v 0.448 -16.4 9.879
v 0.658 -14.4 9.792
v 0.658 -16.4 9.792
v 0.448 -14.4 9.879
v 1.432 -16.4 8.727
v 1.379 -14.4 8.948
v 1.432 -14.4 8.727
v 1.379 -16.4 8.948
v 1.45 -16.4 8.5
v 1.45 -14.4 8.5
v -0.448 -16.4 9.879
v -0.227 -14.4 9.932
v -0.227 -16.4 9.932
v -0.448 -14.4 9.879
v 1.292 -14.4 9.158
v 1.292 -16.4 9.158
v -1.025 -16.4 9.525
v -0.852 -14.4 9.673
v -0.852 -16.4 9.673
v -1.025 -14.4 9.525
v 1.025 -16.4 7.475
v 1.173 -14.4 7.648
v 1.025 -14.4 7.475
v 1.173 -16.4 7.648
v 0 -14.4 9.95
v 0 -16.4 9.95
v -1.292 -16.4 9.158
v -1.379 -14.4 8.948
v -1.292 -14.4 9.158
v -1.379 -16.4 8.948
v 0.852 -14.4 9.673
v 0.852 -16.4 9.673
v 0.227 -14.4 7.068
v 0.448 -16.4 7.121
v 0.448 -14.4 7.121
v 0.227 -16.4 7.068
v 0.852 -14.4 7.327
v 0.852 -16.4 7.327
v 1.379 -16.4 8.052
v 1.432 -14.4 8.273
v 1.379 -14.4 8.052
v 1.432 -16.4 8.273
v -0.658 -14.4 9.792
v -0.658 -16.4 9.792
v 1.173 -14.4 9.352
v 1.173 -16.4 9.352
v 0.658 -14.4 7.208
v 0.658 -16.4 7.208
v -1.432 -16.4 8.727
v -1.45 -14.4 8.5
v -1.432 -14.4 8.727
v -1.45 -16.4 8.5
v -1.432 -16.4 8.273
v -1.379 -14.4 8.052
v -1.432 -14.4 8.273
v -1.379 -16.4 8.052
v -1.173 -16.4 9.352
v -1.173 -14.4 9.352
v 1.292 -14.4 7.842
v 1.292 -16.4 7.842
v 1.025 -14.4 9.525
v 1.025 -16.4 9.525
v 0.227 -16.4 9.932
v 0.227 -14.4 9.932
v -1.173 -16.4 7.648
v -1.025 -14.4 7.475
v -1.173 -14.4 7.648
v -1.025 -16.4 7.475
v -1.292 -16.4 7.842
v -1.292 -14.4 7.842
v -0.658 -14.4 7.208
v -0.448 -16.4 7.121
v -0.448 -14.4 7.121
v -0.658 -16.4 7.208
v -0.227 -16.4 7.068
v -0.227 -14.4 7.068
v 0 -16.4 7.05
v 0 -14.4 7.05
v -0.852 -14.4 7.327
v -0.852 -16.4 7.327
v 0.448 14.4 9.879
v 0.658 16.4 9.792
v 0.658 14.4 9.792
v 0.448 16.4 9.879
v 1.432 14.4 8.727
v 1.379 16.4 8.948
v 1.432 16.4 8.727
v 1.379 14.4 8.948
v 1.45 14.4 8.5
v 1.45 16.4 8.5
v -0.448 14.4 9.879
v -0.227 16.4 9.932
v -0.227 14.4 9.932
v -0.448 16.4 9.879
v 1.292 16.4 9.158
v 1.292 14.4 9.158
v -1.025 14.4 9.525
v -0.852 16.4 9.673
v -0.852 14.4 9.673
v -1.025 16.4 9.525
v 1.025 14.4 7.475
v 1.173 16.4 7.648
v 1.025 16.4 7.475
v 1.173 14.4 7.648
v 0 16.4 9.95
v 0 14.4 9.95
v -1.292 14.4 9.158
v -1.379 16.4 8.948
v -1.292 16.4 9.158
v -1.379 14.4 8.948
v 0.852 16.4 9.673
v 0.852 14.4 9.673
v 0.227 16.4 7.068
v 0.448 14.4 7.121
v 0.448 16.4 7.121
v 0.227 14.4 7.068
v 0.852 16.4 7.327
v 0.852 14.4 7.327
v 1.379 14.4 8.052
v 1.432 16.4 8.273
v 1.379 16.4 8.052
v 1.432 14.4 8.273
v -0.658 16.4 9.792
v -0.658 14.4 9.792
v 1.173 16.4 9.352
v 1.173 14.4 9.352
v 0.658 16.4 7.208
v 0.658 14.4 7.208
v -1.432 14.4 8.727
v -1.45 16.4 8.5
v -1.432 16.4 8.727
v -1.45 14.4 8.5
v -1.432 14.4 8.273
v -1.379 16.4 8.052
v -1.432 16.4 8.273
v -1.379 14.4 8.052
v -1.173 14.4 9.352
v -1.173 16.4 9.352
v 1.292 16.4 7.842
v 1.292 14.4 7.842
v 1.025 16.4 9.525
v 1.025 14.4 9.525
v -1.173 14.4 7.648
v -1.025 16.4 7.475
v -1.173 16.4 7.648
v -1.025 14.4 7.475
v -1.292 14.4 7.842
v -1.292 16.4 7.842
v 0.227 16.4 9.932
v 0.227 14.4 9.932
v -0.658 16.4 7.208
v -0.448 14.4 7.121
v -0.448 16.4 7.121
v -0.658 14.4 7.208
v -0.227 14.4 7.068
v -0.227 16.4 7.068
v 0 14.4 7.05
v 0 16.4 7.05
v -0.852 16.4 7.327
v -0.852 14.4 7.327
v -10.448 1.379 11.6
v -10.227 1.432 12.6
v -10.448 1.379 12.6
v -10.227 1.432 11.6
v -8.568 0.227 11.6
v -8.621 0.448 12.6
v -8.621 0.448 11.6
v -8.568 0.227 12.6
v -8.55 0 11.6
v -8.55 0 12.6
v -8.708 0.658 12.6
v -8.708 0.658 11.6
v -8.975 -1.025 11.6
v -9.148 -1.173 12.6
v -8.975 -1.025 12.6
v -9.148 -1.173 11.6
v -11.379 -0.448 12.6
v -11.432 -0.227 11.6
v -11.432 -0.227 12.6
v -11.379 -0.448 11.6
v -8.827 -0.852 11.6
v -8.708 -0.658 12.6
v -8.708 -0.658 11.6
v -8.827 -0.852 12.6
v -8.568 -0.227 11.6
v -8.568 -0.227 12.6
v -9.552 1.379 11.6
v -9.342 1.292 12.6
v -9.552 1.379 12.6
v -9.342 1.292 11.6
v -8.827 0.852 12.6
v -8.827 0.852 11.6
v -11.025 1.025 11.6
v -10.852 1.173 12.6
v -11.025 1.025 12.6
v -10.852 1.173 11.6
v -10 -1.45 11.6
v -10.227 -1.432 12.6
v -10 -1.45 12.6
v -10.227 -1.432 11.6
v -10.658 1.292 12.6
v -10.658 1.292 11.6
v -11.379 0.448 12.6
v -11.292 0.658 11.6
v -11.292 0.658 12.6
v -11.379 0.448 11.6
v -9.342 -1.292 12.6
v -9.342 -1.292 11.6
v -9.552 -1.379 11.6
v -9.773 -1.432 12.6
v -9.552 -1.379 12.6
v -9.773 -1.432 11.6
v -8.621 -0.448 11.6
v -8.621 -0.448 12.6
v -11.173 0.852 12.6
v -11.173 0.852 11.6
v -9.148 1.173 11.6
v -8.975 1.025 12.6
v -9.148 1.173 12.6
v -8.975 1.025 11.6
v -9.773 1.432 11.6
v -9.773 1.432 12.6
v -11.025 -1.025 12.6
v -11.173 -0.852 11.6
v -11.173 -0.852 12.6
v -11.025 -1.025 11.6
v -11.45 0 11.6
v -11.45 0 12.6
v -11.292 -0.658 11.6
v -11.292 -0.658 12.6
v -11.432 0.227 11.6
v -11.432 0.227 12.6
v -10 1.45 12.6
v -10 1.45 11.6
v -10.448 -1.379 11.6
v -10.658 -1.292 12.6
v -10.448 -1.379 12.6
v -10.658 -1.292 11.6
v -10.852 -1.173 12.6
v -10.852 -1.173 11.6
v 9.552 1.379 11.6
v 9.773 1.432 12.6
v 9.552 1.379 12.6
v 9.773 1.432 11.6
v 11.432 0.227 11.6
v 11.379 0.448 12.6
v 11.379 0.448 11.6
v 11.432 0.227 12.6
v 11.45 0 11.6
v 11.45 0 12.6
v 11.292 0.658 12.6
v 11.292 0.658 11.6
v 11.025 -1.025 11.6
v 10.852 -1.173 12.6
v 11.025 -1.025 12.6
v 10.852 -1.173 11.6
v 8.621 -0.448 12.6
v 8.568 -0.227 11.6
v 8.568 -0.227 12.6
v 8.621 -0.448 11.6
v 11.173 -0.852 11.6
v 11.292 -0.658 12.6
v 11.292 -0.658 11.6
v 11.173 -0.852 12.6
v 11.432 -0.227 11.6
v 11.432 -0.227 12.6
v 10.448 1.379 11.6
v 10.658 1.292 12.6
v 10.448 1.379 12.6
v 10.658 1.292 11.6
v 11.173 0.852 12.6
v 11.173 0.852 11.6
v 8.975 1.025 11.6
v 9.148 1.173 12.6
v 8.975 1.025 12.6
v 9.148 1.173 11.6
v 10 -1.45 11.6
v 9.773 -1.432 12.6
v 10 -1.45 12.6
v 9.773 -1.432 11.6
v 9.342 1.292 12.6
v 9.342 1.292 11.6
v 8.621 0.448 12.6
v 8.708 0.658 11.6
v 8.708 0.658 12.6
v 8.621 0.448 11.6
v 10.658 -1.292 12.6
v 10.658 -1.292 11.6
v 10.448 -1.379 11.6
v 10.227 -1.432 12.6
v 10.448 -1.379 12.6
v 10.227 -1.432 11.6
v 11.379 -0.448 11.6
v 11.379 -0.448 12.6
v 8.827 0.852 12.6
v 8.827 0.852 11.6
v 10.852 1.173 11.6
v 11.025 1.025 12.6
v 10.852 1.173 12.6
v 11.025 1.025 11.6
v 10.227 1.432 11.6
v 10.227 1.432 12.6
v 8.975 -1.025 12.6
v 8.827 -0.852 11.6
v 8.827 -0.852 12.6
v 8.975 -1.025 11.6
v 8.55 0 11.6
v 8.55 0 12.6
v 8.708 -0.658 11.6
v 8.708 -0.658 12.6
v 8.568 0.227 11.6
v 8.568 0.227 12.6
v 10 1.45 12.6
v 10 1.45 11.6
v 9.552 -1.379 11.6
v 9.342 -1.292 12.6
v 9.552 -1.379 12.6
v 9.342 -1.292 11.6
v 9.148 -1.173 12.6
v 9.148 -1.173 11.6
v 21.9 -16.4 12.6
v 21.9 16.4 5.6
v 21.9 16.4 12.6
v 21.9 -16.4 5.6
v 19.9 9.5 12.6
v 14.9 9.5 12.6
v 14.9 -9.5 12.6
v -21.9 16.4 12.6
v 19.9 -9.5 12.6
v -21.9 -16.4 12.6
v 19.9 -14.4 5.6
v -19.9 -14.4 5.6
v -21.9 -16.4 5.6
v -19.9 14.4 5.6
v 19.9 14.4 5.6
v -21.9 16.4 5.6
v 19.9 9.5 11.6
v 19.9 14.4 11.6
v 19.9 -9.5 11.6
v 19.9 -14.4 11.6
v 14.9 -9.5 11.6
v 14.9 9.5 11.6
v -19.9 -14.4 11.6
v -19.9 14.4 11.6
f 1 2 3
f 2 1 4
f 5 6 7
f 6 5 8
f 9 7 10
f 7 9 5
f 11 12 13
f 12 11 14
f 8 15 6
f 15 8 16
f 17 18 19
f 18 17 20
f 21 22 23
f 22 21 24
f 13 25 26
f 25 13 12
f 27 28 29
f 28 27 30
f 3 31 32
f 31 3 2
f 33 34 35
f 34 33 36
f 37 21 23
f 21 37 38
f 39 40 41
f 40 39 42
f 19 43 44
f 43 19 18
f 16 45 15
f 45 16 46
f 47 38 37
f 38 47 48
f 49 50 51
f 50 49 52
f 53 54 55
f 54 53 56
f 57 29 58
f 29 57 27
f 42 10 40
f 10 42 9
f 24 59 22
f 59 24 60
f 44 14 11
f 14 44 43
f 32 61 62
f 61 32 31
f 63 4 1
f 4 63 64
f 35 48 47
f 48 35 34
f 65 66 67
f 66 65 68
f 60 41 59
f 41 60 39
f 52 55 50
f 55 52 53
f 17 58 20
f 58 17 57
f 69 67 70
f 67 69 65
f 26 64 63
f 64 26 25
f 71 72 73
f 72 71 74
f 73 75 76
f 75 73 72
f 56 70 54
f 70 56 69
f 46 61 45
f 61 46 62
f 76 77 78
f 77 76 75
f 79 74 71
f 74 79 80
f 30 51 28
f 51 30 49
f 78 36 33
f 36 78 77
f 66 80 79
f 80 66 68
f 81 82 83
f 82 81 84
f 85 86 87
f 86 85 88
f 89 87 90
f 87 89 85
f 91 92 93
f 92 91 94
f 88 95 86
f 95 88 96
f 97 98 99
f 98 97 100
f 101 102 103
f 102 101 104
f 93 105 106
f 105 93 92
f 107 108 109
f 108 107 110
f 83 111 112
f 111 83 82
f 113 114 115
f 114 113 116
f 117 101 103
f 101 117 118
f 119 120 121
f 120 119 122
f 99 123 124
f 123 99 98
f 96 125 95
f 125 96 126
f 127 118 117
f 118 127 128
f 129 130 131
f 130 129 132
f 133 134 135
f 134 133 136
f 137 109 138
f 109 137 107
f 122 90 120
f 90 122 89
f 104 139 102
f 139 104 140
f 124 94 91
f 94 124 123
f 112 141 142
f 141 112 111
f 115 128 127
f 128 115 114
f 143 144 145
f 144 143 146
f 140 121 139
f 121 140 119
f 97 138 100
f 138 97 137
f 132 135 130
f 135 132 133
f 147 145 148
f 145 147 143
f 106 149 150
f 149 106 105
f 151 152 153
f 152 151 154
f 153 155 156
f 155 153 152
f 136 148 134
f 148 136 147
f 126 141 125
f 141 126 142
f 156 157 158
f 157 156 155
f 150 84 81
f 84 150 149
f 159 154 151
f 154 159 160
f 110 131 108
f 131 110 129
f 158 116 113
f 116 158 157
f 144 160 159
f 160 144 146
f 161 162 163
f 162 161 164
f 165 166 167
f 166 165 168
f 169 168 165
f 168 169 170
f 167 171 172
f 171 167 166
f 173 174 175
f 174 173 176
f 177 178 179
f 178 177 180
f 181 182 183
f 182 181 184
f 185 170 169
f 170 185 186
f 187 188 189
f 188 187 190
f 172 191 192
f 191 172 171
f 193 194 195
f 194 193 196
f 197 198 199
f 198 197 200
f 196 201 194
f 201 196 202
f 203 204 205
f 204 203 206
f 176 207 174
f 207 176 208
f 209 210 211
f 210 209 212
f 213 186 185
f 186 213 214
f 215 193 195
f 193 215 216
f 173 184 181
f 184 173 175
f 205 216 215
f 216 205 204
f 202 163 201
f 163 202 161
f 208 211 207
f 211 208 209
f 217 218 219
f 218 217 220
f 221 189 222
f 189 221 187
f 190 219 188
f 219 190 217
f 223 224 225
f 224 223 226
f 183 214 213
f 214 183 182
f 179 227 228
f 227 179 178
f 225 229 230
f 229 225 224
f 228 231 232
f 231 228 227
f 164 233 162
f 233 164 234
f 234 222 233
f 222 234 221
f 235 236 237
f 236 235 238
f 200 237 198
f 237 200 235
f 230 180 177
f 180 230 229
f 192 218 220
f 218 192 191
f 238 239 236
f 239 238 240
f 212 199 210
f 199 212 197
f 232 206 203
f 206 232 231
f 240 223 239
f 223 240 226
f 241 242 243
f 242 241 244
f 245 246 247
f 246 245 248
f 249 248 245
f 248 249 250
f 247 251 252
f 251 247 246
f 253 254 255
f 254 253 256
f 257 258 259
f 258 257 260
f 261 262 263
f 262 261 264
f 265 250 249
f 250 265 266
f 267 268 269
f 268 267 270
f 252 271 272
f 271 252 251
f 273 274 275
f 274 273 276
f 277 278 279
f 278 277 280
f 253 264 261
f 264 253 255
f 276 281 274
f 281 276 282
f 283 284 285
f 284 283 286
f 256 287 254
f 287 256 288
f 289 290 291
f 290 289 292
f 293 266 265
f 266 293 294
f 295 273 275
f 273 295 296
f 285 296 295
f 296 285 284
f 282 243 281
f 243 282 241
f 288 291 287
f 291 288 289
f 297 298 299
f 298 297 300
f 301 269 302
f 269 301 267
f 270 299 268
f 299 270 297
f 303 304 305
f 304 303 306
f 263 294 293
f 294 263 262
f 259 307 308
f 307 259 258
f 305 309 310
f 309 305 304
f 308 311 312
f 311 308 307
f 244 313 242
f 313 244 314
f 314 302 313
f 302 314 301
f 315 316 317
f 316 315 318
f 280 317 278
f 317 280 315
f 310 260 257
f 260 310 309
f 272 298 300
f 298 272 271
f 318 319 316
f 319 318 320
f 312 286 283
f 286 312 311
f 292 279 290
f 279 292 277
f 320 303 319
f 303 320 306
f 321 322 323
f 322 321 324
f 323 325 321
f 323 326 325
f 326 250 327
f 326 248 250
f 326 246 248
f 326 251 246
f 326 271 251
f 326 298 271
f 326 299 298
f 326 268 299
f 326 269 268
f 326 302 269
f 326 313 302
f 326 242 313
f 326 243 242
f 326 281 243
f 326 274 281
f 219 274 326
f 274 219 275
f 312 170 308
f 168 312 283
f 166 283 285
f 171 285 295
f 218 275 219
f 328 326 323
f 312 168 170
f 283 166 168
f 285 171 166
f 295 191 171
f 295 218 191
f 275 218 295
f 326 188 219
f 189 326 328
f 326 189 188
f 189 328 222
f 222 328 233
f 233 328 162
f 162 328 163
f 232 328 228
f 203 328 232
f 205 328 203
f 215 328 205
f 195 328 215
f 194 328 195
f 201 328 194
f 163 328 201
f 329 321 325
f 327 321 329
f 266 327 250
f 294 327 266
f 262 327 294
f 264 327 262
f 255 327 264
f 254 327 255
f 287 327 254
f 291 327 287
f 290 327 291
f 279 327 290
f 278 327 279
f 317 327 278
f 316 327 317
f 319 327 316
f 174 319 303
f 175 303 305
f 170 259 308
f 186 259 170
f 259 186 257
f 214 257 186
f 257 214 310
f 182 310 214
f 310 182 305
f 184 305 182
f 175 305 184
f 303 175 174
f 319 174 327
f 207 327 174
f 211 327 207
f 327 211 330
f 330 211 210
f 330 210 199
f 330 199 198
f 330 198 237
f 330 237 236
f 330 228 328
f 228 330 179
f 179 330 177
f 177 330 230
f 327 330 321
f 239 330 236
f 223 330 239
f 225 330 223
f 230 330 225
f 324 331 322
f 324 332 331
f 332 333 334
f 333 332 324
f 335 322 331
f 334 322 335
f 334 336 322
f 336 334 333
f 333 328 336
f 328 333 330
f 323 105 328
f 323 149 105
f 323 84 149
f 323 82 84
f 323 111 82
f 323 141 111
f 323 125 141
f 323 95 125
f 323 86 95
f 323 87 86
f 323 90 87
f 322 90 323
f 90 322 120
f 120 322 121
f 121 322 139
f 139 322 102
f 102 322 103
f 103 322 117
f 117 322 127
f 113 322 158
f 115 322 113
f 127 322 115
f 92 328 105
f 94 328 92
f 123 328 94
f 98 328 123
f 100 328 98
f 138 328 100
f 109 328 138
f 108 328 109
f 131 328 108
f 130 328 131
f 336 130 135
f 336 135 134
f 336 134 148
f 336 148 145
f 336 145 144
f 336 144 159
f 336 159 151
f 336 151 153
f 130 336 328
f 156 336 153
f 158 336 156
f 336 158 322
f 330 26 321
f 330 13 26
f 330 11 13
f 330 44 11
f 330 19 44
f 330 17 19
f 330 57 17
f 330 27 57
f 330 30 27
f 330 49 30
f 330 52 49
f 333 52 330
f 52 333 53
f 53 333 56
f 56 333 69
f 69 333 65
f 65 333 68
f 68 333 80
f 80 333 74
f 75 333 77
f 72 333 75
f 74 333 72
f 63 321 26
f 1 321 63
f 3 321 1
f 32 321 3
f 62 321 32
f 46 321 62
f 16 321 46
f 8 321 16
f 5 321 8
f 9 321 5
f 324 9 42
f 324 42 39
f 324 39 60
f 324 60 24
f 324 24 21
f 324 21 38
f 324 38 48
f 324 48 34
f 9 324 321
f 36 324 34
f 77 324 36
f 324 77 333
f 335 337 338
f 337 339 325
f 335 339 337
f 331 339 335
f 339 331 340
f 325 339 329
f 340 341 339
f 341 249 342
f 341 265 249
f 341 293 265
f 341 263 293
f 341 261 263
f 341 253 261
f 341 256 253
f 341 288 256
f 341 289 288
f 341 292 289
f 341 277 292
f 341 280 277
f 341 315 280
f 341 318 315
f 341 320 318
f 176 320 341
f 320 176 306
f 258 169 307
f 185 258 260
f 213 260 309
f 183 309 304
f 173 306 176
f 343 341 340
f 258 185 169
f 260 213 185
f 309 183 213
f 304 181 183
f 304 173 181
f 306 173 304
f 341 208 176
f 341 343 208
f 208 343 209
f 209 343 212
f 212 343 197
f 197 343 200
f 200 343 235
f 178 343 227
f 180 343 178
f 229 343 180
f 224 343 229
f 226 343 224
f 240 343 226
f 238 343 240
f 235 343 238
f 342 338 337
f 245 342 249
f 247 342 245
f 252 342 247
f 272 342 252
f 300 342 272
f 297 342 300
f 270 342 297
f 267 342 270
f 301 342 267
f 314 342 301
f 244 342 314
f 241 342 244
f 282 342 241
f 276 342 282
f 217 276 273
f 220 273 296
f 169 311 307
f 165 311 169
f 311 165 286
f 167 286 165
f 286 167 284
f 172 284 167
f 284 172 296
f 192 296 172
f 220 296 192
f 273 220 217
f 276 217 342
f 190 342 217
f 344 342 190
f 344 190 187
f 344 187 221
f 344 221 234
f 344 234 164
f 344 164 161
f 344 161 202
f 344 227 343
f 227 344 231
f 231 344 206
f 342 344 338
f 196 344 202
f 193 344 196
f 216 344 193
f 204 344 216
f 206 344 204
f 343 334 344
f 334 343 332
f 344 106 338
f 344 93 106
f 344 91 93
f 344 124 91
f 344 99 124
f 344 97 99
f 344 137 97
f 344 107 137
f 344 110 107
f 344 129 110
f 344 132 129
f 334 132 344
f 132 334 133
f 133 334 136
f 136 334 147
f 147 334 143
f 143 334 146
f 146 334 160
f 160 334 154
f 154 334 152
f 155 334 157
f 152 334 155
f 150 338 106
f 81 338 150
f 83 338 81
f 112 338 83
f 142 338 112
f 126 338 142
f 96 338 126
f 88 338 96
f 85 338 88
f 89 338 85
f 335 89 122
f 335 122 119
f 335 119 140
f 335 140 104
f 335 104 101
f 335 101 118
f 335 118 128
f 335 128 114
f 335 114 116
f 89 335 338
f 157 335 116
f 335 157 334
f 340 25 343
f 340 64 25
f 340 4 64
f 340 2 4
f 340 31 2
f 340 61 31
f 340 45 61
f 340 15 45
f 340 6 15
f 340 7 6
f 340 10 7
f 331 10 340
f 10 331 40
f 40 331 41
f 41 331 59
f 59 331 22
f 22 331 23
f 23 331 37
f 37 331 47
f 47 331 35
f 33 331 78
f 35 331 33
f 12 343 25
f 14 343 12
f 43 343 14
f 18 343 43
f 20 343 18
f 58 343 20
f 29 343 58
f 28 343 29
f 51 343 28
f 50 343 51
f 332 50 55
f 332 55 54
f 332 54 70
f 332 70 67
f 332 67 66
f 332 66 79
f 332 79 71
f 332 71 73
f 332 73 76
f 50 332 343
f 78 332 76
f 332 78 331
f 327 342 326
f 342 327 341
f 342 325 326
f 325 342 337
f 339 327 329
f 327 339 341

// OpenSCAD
// file: ../lib/gopro_like_connector.scad
$fn = 40;

module connector(wall=2, sz_x=19, sz_y=15) {
  translate([7+(19-sz_x)/2, 5.5+(15-sz_y)/2, 7.5]) {
    cube([sz_x, sz_y, wall]);
  }
  translate([26.5, 5.4, 7.4]) {
    rotate([0, 90, 90]) {
      for(y=[0, 6.4]) {
        translate([-10.2, 6.9+y, 7.6]) {
          rotate([90, 0, 0]) {
            difference() {
              union() {
                cylinder(d=14.7, h=2.6, center=true);
                translate([5, 0, 0]) {
                  cube([10, 14.7, 2.6], center=true);
                }
              }
              translate([-1.4, 0.1, 0]) {
                cylinder(d=6, h=3, center=true);
              }
            }
          }
        }
      }
    }
  }
}

connector();
// main file
use <../lib/gopro_like_connector.scad>

$fn = 40;

wall = 2;

ttf_hole_sz_x = 26;
ttf_hole_sz_y = 26;
ttf_hole_shift_x = 3.8;

ttf_stand_d = 4;
ttf_stand_h = 3;
ttf_stand_hole_d = 1.8;

ttf_pcb_sz_x = 39.8;
ttf_pcb_sz_y = 28.8;
ttf_pcb_sz_z = 1.6;

border_sz_z = ttf_pcb_sz_z+ttf_stand_h;

stand_dist_x = 34.2;
stand_dist_y = 23.2;

hole_d = 2.9;
hole_d_through = 3.6;

ear_hole_d = hole_d_through;
ear_sz_x = ear_hole_d + 2 * wall;
ear_sz_y = 2;
ear_sz_z = wall+border_sz_z+5;

pins_hole_sz_x = 5;
pins_hole_sz_y = 19;


border_butt_sz_z = ear_sz_z-wall-border_sz_z;

module ears(hole_mode=false) {
  // ears
  translate([0, 0, ear_sz_z/2]) {
    for(y=[-1,1]) {
      translate([0, y*(ttf_pcb_sz_y+ear_sz_y+2*wall)/2, 0]) {
        if(!hole_mode) {
          translate([0, 0, -ear_sz_x/4]) {
            cube([ear_sz_x, ear_sz_y, ear_sz_z+wall-ear_sz_x/2], center=true);
          }
        }
        translate([0, 0, (ear_sz_z-ear_sz_x+wall)/2]) {
          rotate([90, 0, 0]) {
            cylinder(d=hole_mode ? ear_hole_d : ear_sz_x, h=ear_sz_y+(hole_mode ? 1 : 0), center=true);
          }
        }
      }
    }
  }
}

module ttf_face_part() {
  difference() {
    union() {
      difference() {
        translate([0, 0, border_sz_z/2]) {
          cube([ttf_pcb_sz_x+2*wall, ttf_pcb_sz_y+2*wall, wall+border_sz_z], true);
        }
        translate([0, 0, (border_sz_z)/2+wall]) {
          cube([ttf_pcb_sz_x, ttf_pcb_sz_y, wall+border_sz_z], true);
        }
      }
      for(x=[-1,1]) {
        for(y=[-1,1]) {
          translate([x*stand_dist_x/2, y*stand_dist_y/2, (wall+ttf_stand_h)/2]) {
            cylinder(d=ttf_stand_d, h=ttf_stand_h, center=true);
          }
        }
      }
      ears();
    }
    // ttf hole
    translate([ttf_hole_shift_x/2, 0, 0]) {
      cube([ttf_hole_sz_x, ttf_hole_sz_y, wall*2], center=true);
    }
    // stand holes
    for(x=[-1,1]) {
      for(y=[-1,1]) {
        translate([x*stand_dist_x/2, y*stand_dist_y/2, (1+ttf_stand_h)/2]) {
          cylinder(d=ttf_stand_hole_d, h=ttf_stand_h+wall-1, center=true);
        }
      }
    }
    // ear holes
    ears(hole_mode=true);
  }
}

module ttf_butt_part() {
  difference() {
    translate([0, 0, border_butt_sz_z/2]) {
      cube([ttf_pcb_sz_x+2*wall, ttf_pcb_sz_y+2*wall, wall+border_butt_sz_z], true);
    }
    translate([0, 0, (border_butt_sz_z-wall)/2]) {
      cube([ttf_pcb_sz_x, ttf_pcb_sz_y, wall+border_butt_sz_z], true);
    }
    // ears holes
    translate([0, 0, ear_sz_x/4]) {
      for(y=[-1,1]) {
        translate([0, y*(ttf_pcb_sz_y+2*wall)/2, 0]) {
            rotate([90, 0, 0]) {
              cylinder(d=hole_d, h=20, center=true);
            }
        }
      }
    }
    for(x=[-1,1]) {
      translate([x*20/2, 0, 0]) {
        cylinder(d=hole_d, h=20, center=true);
      }
    }
    // pins hole
    translate([(ttf_pcb_sz_x-pins_hole_sz_x)/2, 0, 0]) {
      cube([pins_hole_sz_x, pins_hole_sz_y, 20], center=true);
    }
  }
}

module pole_attachment() {
  difference() {
    translate([-17, -13, 0]) {
      connector(sz_x=30);
    }
    for(x=[-1,1]) {
      translate([x*20/2, 0, 0]) {
        cylinder(d=hole_d_through, h=20, center=true);
      }
    }
  }
}


translate([0, 0, border_sz_z+wall]) {
  //pole_attachment();
}

//ttf_face_part();
translate([0, 0, border_sz_z+wall]) {
  ttf_butt_part();
}
